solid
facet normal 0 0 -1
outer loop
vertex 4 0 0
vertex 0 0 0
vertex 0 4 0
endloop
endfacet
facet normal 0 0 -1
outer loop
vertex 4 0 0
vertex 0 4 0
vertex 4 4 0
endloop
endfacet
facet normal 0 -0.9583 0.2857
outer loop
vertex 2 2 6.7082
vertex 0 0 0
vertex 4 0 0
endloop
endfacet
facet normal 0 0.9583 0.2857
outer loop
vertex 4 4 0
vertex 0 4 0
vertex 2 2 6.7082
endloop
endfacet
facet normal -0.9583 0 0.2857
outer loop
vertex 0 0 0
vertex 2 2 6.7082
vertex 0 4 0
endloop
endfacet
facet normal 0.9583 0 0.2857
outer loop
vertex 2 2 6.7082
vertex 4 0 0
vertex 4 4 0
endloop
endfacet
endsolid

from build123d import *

# Parameters (mm, degrees)
F1_DEPTH = 4
F5_DEPTH = 25
F8_DEPTH = 25


with BuildPart() as f1:
    # F0 (on Front) → F1 (new body)
    with BuildSketch(Plane.XZ):
        Polygon((2, 6.7082039325), (0, 0), (4, 0), align=None)
    extrude(amount=-F1_DEPTH)

    # F4 (on 3pt) → F5 (cut)
    with BuildSketch(Plane(origin=(0, 0, 0), x_dir=(1, 0, 0), z_dir=(0, -0.9583148475, 0.2857142857))):
        Polygon((4, 0), (2, 7), (0, 0), align=None)
    extrude(amount=F5_DEPTH, mode=Mode.SUBTRACT)

    # F7 (on 3pt) → F8 (cut)
    with BuildSketch(Plane(origin=(0, 3.6734693878, 1.0952169686), x_dir=(1, 0, 0), z_dir=(0, -0.9583148475, -0.2857142857))):
        Polygon((4, -1.1428571429), (2, 5.8571428571), (0, -1.1428571429), align=None)
    extrude(amount=-F8_DEPTH, mode=Mode.SUBTRACT)


solid = f1.part
